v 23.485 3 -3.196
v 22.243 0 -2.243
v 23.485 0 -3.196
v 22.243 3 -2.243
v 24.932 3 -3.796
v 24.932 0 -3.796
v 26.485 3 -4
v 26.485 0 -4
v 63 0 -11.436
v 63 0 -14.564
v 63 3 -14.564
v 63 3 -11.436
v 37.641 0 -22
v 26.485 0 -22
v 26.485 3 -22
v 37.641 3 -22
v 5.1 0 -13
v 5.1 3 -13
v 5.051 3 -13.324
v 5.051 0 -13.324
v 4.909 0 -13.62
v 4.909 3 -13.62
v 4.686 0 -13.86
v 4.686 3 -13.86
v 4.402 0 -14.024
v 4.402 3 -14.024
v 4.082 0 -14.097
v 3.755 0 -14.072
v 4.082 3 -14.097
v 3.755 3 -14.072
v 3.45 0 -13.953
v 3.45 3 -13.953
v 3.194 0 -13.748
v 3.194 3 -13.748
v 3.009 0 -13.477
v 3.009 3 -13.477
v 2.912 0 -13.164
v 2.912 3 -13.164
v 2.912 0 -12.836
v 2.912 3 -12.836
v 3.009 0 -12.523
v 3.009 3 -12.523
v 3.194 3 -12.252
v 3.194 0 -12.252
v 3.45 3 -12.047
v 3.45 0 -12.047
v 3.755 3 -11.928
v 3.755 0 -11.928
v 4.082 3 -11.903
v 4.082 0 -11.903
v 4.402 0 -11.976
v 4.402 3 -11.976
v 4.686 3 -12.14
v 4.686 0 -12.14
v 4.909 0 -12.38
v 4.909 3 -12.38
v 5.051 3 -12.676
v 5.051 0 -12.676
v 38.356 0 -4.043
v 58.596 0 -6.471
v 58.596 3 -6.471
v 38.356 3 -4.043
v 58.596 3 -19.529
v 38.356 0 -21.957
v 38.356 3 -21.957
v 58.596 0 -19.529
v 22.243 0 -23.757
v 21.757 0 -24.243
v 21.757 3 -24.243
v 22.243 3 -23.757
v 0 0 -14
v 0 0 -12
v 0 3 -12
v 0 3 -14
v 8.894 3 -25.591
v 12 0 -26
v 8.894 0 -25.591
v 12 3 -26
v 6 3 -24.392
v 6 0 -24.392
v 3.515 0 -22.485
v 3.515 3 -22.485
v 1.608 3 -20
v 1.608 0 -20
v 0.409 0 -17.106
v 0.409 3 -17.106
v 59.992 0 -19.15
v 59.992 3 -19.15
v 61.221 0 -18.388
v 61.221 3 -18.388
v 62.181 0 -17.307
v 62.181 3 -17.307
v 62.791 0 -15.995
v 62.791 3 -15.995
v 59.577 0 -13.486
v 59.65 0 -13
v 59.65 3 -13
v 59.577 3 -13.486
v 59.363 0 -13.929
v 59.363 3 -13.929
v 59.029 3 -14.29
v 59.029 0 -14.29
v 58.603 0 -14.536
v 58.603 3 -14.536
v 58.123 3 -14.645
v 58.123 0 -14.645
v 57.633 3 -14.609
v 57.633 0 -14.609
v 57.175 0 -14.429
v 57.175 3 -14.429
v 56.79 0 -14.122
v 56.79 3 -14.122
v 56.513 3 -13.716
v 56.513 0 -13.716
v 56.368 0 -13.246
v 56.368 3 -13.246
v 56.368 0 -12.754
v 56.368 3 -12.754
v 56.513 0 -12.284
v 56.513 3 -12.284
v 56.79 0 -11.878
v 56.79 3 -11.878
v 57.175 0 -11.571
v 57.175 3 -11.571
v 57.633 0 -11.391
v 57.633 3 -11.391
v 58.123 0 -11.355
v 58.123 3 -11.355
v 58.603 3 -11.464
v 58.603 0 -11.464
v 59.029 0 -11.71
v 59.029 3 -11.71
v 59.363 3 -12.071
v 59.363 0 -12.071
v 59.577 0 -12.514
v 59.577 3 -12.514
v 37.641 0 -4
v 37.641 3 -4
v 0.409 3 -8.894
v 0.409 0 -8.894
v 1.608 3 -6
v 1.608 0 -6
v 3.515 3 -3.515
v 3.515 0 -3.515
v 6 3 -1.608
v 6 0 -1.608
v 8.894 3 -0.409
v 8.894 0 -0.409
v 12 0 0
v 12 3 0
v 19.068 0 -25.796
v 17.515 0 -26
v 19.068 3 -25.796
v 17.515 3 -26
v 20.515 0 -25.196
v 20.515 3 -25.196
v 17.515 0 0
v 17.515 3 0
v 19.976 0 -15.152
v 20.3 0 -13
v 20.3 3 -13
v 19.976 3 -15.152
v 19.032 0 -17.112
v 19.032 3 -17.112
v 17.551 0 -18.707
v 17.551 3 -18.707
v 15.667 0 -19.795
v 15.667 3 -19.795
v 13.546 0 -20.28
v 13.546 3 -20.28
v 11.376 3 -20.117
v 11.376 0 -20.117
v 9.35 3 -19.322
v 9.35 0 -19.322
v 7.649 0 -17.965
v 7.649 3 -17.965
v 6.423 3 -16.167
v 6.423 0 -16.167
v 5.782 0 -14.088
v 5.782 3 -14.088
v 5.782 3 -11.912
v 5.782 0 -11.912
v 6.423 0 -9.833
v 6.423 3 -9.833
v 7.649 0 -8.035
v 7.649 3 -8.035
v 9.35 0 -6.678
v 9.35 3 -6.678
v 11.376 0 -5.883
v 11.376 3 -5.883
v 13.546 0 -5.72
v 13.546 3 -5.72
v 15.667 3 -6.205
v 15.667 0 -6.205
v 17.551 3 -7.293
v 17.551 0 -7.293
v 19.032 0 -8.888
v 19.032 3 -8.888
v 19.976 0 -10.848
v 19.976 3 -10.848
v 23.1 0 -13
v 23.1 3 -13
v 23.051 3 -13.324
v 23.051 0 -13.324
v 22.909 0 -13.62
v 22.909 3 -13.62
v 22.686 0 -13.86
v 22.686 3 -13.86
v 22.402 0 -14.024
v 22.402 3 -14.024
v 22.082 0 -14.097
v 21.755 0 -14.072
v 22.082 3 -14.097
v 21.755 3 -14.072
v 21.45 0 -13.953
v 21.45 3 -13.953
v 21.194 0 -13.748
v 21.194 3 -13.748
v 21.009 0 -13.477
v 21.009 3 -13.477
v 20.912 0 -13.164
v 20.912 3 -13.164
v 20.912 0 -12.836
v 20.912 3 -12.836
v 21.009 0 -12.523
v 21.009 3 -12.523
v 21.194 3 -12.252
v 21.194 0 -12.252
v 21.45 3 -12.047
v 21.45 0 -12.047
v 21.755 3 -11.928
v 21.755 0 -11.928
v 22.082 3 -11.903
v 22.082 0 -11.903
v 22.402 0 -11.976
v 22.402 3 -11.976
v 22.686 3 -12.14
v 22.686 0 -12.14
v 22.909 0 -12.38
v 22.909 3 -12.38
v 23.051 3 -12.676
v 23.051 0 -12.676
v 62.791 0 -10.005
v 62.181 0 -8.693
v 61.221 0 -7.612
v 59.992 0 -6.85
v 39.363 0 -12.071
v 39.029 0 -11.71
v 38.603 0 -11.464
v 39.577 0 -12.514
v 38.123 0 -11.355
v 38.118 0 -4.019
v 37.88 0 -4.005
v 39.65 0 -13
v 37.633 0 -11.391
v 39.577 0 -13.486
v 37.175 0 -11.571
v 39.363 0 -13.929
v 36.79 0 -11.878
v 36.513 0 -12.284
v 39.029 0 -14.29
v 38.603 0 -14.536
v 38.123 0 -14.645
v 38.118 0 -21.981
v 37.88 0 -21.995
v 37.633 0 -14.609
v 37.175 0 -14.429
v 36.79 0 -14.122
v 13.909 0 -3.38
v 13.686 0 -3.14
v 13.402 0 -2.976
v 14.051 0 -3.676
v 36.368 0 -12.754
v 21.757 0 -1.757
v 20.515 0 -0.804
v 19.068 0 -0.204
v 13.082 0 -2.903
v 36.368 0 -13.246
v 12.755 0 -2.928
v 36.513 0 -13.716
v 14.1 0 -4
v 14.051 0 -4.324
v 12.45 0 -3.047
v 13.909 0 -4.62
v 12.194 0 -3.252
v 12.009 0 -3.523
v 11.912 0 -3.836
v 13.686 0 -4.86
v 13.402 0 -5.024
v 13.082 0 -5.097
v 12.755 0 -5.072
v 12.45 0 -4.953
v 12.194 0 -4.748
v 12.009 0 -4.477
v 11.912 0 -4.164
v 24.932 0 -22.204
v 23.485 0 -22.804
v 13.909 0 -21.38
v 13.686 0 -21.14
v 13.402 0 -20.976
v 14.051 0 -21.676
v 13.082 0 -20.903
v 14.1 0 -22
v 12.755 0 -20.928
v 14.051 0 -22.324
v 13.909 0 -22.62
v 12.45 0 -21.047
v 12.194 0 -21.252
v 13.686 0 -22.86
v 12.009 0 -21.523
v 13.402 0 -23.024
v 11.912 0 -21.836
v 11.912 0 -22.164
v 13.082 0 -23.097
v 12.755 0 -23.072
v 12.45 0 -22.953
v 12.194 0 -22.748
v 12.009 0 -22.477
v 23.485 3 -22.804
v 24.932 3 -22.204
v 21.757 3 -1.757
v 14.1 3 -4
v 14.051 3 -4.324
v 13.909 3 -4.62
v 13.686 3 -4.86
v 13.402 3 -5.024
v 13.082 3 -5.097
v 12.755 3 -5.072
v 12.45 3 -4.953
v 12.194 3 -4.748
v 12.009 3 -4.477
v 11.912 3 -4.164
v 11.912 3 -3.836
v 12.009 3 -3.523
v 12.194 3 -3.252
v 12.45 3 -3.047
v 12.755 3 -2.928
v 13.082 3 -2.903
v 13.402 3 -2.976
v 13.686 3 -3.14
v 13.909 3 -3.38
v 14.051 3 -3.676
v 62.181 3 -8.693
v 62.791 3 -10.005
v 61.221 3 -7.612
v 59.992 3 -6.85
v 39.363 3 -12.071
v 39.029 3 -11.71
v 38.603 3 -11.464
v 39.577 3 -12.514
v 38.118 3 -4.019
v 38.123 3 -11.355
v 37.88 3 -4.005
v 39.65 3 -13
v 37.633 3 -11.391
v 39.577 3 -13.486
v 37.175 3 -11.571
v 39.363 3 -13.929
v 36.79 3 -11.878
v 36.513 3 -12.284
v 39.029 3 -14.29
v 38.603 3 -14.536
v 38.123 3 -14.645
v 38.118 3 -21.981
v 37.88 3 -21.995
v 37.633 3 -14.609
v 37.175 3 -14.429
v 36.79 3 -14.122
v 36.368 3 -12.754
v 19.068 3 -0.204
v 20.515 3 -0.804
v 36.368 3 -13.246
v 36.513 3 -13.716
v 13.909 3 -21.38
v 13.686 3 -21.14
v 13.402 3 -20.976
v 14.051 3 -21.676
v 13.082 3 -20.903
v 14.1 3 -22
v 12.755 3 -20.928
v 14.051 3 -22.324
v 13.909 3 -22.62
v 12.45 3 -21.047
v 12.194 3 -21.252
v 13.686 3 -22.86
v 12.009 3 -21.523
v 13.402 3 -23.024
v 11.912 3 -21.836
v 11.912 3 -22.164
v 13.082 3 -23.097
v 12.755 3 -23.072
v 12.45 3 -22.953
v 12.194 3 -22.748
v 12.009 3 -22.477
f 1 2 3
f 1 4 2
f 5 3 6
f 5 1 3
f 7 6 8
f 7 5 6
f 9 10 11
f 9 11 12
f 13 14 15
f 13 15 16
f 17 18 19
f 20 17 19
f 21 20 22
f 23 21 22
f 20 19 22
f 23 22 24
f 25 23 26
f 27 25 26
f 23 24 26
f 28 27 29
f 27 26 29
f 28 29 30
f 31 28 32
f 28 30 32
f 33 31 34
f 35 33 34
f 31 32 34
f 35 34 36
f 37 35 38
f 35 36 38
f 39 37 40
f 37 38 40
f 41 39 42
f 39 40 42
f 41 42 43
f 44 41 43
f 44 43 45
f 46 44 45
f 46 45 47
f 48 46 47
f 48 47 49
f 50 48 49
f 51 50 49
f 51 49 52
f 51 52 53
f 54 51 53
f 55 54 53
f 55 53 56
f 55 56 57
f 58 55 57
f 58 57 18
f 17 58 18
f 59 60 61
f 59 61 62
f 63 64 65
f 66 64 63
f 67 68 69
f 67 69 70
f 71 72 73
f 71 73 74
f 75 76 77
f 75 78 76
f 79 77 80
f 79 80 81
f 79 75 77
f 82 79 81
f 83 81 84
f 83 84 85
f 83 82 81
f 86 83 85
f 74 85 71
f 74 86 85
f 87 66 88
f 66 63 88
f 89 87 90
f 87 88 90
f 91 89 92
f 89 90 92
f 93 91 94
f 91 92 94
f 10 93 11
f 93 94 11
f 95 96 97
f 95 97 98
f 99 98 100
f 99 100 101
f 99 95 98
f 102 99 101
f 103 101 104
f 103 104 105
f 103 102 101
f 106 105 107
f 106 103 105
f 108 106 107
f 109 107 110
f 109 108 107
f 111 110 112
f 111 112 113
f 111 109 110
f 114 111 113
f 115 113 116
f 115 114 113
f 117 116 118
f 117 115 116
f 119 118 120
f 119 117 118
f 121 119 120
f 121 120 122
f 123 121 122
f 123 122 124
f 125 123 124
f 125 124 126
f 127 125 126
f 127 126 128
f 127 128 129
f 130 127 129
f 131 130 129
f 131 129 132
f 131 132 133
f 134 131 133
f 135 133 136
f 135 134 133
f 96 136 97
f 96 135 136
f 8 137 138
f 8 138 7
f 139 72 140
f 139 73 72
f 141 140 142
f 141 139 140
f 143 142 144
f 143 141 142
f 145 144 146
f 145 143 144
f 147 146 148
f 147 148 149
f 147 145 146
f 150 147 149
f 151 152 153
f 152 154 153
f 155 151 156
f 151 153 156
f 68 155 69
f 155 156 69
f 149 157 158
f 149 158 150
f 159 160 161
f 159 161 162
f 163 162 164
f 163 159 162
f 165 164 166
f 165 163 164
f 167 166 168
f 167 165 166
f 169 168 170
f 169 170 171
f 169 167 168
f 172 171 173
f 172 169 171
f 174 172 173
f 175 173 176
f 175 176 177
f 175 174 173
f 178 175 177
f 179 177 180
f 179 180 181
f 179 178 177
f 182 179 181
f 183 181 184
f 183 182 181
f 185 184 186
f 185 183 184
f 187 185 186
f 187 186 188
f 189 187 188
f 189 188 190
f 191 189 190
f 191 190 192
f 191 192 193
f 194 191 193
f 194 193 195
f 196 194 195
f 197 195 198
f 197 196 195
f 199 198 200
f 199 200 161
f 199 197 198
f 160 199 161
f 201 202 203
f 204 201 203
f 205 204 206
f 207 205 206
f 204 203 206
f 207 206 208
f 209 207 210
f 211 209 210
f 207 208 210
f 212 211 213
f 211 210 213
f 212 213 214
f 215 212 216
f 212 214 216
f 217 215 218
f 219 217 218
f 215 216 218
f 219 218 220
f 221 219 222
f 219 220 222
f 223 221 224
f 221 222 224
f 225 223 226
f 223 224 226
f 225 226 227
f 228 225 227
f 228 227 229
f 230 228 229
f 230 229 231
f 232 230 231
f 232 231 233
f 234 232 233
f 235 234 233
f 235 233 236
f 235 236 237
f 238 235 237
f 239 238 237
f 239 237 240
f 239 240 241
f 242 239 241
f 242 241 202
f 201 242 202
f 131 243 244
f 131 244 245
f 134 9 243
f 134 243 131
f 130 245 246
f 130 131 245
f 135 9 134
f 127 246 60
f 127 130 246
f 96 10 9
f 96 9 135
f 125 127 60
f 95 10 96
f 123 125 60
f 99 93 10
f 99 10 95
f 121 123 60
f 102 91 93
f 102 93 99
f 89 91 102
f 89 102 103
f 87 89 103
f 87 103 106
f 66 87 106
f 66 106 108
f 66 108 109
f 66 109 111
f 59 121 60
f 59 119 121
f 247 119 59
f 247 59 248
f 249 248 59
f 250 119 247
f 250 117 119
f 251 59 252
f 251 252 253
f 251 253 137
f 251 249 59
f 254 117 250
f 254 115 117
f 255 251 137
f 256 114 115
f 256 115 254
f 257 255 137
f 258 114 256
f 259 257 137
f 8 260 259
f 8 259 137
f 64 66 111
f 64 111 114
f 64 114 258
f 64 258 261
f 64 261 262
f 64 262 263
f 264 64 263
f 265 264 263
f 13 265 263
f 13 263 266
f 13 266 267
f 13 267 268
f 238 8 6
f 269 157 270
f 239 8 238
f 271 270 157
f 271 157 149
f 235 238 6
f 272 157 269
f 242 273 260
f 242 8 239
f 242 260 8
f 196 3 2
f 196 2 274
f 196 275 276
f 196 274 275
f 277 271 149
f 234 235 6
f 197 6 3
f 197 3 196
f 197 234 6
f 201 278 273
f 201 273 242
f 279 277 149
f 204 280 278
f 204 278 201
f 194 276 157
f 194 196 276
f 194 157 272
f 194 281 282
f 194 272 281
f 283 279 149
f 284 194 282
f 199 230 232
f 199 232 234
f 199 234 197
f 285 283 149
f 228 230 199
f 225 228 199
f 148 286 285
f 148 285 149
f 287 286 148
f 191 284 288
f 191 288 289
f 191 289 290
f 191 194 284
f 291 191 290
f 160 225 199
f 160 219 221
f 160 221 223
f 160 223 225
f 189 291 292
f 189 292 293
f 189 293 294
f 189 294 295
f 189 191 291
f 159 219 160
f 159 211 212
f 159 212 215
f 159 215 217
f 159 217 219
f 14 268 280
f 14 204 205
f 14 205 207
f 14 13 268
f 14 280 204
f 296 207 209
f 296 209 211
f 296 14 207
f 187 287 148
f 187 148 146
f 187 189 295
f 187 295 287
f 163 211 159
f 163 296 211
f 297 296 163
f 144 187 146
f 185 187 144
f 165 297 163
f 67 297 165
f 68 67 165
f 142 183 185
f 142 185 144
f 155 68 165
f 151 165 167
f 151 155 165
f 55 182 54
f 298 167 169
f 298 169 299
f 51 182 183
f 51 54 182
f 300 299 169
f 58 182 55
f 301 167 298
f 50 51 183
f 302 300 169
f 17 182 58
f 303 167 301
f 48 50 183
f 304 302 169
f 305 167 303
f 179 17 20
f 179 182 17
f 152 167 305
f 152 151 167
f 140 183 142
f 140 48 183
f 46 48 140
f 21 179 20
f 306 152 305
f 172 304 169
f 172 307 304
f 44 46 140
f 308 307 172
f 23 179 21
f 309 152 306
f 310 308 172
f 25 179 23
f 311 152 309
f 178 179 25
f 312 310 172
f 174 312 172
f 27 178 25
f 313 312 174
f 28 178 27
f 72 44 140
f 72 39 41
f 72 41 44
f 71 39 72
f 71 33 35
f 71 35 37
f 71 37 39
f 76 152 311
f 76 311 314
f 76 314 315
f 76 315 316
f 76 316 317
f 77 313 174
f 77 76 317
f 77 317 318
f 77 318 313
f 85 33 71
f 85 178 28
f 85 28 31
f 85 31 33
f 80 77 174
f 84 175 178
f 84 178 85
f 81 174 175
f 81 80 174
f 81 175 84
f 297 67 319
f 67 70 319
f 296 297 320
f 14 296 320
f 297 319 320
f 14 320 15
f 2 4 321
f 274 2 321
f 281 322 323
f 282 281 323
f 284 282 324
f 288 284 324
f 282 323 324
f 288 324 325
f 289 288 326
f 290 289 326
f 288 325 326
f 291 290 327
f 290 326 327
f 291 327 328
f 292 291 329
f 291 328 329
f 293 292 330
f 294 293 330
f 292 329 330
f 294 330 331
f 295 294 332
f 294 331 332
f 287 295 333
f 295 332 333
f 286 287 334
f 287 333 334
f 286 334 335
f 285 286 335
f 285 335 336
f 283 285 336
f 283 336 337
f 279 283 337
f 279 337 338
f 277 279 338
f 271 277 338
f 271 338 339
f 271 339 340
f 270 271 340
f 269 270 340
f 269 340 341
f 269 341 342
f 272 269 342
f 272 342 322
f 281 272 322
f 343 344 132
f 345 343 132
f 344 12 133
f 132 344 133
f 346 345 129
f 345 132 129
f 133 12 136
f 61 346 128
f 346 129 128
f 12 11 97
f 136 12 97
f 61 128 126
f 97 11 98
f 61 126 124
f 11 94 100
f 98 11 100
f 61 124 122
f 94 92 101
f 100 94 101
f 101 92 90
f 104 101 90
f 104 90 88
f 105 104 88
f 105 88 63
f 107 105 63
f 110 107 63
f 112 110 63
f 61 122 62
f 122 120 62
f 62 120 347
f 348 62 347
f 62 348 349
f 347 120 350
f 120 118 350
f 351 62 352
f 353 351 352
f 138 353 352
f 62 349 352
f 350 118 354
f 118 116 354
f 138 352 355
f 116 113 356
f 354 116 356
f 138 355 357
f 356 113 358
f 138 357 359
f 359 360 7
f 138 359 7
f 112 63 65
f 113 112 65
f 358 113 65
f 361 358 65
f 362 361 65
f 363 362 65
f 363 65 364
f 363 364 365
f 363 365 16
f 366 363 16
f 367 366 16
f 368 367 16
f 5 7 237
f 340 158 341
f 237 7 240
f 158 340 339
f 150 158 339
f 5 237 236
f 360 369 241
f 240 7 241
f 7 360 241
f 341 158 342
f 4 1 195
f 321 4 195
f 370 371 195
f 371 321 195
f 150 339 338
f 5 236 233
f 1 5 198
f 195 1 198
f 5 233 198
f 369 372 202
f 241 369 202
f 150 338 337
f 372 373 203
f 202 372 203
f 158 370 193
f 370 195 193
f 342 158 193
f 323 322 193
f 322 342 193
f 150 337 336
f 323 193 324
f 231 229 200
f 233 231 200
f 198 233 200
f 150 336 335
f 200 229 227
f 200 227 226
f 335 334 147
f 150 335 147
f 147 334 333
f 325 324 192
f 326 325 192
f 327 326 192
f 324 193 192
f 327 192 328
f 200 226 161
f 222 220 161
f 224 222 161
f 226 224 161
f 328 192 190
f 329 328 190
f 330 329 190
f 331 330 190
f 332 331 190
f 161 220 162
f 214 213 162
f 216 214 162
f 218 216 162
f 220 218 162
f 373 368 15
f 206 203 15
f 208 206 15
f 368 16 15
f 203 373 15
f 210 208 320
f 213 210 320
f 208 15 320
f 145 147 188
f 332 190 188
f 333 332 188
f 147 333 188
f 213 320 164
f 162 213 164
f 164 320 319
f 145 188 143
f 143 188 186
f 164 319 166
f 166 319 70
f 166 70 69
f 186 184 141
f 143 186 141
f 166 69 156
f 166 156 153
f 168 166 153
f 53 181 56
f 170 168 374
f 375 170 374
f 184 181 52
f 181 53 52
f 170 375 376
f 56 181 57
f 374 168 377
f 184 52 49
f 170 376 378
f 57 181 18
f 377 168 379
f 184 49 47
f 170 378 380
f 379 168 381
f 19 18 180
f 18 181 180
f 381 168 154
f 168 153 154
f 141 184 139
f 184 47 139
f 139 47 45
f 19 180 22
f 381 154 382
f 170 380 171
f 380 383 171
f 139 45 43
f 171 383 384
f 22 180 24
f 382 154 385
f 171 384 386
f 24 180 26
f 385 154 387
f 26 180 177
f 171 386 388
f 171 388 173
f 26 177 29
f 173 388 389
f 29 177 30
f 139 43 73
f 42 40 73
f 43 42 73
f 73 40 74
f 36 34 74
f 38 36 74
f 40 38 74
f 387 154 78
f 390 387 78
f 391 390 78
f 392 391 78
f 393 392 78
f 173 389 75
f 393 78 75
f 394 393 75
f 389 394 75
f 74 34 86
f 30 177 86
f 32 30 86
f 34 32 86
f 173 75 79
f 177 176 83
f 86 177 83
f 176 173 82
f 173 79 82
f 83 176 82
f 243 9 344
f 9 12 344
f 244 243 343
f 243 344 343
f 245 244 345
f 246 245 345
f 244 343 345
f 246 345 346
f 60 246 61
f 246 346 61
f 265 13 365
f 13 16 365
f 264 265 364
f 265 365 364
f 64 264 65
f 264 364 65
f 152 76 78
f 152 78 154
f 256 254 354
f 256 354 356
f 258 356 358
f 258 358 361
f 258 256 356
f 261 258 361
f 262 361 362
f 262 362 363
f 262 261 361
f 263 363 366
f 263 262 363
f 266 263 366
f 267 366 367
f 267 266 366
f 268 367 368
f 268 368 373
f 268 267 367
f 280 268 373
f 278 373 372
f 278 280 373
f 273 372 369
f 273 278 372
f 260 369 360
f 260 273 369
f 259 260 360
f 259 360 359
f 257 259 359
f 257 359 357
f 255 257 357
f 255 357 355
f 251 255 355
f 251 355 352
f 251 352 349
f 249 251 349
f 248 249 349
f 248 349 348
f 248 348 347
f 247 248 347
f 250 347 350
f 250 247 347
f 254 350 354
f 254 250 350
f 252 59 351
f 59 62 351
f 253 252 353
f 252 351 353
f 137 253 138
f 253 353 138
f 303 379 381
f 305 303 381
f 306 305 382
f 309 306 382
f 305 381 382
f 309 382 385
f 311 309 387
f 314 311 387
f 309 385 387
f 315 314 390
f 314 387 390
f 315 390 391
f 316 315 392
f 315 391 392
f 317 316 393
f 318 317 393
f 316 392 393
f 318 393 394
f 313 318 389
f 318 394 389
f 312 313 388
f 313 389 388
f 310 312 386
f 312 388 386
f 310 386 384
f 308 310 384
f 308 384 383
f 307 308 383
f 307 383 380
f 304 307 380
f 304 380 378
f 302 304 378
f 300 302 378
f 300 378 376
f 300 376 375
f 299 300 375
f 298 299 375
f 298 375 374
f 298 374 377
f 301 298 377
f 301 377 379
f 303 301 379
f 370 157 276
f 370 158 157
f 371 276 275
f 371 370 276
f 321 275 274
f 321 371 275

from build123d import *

# Parameters (mm, degrees)
SKETCH1_R           = 7.3
SKETCH1_R_2         = 1.65
BOSS_EXTRUDE1_DEPTH = 3
FILLET1_R           = 12
FILLET4_R           = 6
FILLET5_R           = 5
SKETCH2_R           = 1.1
CUT_EXTRUDE1_DEPTH  = 10


with BuildPart() as part:
    # Sketch1 → Boss-Extrude1 (new body)
    with BuildSketch(Plane(origin=(0, 0, 0), x_dir=(1, 0, 0), z_dir=(0, 1, 0))):
        Polygon((20, 26), (24, 22), (38, 22), (63, 19), (63, 7), (38, 4), (24, 4), (20, 0), (0, 0), (0, 26), align=None)
        with Locations((13, 13)):
            Circle(SKETCH1_R, mode=Mode.SUBTRACT)
        with Locations((38, 13)):
            Circle(SKETCH1_R_2, mode=Mode.SUBTRACT)
        with Locations((58, 13)):
            Circle(SKETCH1_R_2, mode=Mode.SUBTRACT)
    extrude(amount=BOSS_EXTRUDE1_DEPTH)

    # Fillet1
    fillet1_edges = [part.edges().sort_by_distance(p)[0] for p in [
        (0, 1.5, 0),
        (0, 1.5, -26),
    ]]
    fillet(fillet1_edges, radius=FILLET1_R)

    # Fillet4
    fillet4_edges = [part.edges().sort_by_distance(p)[0] for p in [
        (20, 1.5, -26),
        (24, 1.5, -22),
        (38, 1.5, -22),
        (38, 1.5, -4),
        (24, 1.5, -4),
        (20, 1.5, 0),
    ]]
    fillet(fillet4_edges, radius=FILLET4_R)

    # Fillet5
    fillet5_edges = [part.edges().sort_by_distance(p)[0] for p in [
        (63, 1.5, -19),
        (63, 1.5, -7),
    ]]
    fillet(fillet5_edges, radius=FILLET5_R)

    # Sketch2 → Cut-Extrude1 (cut)
    with BuildSketch(Plane(origin=(0, 3, 0), x_dir=(1, 0, 0), z_dir=(0, 1, 0))):
        with Locations((22, 13)):
            Circle(SKETCH2_R)
        with Locations((13, 4)):
            Circle(SKETCH2_R)
        with Locations((4, 13)):
            Circle(SKETCH2_R)
        with Locations((13, 22)):
            Circle(SKETCH2_R)
    extrude(amount=-CUT_EXTRUDE1_DEPTH, mode=Mode.SUBTRACT)


solid = part.part
